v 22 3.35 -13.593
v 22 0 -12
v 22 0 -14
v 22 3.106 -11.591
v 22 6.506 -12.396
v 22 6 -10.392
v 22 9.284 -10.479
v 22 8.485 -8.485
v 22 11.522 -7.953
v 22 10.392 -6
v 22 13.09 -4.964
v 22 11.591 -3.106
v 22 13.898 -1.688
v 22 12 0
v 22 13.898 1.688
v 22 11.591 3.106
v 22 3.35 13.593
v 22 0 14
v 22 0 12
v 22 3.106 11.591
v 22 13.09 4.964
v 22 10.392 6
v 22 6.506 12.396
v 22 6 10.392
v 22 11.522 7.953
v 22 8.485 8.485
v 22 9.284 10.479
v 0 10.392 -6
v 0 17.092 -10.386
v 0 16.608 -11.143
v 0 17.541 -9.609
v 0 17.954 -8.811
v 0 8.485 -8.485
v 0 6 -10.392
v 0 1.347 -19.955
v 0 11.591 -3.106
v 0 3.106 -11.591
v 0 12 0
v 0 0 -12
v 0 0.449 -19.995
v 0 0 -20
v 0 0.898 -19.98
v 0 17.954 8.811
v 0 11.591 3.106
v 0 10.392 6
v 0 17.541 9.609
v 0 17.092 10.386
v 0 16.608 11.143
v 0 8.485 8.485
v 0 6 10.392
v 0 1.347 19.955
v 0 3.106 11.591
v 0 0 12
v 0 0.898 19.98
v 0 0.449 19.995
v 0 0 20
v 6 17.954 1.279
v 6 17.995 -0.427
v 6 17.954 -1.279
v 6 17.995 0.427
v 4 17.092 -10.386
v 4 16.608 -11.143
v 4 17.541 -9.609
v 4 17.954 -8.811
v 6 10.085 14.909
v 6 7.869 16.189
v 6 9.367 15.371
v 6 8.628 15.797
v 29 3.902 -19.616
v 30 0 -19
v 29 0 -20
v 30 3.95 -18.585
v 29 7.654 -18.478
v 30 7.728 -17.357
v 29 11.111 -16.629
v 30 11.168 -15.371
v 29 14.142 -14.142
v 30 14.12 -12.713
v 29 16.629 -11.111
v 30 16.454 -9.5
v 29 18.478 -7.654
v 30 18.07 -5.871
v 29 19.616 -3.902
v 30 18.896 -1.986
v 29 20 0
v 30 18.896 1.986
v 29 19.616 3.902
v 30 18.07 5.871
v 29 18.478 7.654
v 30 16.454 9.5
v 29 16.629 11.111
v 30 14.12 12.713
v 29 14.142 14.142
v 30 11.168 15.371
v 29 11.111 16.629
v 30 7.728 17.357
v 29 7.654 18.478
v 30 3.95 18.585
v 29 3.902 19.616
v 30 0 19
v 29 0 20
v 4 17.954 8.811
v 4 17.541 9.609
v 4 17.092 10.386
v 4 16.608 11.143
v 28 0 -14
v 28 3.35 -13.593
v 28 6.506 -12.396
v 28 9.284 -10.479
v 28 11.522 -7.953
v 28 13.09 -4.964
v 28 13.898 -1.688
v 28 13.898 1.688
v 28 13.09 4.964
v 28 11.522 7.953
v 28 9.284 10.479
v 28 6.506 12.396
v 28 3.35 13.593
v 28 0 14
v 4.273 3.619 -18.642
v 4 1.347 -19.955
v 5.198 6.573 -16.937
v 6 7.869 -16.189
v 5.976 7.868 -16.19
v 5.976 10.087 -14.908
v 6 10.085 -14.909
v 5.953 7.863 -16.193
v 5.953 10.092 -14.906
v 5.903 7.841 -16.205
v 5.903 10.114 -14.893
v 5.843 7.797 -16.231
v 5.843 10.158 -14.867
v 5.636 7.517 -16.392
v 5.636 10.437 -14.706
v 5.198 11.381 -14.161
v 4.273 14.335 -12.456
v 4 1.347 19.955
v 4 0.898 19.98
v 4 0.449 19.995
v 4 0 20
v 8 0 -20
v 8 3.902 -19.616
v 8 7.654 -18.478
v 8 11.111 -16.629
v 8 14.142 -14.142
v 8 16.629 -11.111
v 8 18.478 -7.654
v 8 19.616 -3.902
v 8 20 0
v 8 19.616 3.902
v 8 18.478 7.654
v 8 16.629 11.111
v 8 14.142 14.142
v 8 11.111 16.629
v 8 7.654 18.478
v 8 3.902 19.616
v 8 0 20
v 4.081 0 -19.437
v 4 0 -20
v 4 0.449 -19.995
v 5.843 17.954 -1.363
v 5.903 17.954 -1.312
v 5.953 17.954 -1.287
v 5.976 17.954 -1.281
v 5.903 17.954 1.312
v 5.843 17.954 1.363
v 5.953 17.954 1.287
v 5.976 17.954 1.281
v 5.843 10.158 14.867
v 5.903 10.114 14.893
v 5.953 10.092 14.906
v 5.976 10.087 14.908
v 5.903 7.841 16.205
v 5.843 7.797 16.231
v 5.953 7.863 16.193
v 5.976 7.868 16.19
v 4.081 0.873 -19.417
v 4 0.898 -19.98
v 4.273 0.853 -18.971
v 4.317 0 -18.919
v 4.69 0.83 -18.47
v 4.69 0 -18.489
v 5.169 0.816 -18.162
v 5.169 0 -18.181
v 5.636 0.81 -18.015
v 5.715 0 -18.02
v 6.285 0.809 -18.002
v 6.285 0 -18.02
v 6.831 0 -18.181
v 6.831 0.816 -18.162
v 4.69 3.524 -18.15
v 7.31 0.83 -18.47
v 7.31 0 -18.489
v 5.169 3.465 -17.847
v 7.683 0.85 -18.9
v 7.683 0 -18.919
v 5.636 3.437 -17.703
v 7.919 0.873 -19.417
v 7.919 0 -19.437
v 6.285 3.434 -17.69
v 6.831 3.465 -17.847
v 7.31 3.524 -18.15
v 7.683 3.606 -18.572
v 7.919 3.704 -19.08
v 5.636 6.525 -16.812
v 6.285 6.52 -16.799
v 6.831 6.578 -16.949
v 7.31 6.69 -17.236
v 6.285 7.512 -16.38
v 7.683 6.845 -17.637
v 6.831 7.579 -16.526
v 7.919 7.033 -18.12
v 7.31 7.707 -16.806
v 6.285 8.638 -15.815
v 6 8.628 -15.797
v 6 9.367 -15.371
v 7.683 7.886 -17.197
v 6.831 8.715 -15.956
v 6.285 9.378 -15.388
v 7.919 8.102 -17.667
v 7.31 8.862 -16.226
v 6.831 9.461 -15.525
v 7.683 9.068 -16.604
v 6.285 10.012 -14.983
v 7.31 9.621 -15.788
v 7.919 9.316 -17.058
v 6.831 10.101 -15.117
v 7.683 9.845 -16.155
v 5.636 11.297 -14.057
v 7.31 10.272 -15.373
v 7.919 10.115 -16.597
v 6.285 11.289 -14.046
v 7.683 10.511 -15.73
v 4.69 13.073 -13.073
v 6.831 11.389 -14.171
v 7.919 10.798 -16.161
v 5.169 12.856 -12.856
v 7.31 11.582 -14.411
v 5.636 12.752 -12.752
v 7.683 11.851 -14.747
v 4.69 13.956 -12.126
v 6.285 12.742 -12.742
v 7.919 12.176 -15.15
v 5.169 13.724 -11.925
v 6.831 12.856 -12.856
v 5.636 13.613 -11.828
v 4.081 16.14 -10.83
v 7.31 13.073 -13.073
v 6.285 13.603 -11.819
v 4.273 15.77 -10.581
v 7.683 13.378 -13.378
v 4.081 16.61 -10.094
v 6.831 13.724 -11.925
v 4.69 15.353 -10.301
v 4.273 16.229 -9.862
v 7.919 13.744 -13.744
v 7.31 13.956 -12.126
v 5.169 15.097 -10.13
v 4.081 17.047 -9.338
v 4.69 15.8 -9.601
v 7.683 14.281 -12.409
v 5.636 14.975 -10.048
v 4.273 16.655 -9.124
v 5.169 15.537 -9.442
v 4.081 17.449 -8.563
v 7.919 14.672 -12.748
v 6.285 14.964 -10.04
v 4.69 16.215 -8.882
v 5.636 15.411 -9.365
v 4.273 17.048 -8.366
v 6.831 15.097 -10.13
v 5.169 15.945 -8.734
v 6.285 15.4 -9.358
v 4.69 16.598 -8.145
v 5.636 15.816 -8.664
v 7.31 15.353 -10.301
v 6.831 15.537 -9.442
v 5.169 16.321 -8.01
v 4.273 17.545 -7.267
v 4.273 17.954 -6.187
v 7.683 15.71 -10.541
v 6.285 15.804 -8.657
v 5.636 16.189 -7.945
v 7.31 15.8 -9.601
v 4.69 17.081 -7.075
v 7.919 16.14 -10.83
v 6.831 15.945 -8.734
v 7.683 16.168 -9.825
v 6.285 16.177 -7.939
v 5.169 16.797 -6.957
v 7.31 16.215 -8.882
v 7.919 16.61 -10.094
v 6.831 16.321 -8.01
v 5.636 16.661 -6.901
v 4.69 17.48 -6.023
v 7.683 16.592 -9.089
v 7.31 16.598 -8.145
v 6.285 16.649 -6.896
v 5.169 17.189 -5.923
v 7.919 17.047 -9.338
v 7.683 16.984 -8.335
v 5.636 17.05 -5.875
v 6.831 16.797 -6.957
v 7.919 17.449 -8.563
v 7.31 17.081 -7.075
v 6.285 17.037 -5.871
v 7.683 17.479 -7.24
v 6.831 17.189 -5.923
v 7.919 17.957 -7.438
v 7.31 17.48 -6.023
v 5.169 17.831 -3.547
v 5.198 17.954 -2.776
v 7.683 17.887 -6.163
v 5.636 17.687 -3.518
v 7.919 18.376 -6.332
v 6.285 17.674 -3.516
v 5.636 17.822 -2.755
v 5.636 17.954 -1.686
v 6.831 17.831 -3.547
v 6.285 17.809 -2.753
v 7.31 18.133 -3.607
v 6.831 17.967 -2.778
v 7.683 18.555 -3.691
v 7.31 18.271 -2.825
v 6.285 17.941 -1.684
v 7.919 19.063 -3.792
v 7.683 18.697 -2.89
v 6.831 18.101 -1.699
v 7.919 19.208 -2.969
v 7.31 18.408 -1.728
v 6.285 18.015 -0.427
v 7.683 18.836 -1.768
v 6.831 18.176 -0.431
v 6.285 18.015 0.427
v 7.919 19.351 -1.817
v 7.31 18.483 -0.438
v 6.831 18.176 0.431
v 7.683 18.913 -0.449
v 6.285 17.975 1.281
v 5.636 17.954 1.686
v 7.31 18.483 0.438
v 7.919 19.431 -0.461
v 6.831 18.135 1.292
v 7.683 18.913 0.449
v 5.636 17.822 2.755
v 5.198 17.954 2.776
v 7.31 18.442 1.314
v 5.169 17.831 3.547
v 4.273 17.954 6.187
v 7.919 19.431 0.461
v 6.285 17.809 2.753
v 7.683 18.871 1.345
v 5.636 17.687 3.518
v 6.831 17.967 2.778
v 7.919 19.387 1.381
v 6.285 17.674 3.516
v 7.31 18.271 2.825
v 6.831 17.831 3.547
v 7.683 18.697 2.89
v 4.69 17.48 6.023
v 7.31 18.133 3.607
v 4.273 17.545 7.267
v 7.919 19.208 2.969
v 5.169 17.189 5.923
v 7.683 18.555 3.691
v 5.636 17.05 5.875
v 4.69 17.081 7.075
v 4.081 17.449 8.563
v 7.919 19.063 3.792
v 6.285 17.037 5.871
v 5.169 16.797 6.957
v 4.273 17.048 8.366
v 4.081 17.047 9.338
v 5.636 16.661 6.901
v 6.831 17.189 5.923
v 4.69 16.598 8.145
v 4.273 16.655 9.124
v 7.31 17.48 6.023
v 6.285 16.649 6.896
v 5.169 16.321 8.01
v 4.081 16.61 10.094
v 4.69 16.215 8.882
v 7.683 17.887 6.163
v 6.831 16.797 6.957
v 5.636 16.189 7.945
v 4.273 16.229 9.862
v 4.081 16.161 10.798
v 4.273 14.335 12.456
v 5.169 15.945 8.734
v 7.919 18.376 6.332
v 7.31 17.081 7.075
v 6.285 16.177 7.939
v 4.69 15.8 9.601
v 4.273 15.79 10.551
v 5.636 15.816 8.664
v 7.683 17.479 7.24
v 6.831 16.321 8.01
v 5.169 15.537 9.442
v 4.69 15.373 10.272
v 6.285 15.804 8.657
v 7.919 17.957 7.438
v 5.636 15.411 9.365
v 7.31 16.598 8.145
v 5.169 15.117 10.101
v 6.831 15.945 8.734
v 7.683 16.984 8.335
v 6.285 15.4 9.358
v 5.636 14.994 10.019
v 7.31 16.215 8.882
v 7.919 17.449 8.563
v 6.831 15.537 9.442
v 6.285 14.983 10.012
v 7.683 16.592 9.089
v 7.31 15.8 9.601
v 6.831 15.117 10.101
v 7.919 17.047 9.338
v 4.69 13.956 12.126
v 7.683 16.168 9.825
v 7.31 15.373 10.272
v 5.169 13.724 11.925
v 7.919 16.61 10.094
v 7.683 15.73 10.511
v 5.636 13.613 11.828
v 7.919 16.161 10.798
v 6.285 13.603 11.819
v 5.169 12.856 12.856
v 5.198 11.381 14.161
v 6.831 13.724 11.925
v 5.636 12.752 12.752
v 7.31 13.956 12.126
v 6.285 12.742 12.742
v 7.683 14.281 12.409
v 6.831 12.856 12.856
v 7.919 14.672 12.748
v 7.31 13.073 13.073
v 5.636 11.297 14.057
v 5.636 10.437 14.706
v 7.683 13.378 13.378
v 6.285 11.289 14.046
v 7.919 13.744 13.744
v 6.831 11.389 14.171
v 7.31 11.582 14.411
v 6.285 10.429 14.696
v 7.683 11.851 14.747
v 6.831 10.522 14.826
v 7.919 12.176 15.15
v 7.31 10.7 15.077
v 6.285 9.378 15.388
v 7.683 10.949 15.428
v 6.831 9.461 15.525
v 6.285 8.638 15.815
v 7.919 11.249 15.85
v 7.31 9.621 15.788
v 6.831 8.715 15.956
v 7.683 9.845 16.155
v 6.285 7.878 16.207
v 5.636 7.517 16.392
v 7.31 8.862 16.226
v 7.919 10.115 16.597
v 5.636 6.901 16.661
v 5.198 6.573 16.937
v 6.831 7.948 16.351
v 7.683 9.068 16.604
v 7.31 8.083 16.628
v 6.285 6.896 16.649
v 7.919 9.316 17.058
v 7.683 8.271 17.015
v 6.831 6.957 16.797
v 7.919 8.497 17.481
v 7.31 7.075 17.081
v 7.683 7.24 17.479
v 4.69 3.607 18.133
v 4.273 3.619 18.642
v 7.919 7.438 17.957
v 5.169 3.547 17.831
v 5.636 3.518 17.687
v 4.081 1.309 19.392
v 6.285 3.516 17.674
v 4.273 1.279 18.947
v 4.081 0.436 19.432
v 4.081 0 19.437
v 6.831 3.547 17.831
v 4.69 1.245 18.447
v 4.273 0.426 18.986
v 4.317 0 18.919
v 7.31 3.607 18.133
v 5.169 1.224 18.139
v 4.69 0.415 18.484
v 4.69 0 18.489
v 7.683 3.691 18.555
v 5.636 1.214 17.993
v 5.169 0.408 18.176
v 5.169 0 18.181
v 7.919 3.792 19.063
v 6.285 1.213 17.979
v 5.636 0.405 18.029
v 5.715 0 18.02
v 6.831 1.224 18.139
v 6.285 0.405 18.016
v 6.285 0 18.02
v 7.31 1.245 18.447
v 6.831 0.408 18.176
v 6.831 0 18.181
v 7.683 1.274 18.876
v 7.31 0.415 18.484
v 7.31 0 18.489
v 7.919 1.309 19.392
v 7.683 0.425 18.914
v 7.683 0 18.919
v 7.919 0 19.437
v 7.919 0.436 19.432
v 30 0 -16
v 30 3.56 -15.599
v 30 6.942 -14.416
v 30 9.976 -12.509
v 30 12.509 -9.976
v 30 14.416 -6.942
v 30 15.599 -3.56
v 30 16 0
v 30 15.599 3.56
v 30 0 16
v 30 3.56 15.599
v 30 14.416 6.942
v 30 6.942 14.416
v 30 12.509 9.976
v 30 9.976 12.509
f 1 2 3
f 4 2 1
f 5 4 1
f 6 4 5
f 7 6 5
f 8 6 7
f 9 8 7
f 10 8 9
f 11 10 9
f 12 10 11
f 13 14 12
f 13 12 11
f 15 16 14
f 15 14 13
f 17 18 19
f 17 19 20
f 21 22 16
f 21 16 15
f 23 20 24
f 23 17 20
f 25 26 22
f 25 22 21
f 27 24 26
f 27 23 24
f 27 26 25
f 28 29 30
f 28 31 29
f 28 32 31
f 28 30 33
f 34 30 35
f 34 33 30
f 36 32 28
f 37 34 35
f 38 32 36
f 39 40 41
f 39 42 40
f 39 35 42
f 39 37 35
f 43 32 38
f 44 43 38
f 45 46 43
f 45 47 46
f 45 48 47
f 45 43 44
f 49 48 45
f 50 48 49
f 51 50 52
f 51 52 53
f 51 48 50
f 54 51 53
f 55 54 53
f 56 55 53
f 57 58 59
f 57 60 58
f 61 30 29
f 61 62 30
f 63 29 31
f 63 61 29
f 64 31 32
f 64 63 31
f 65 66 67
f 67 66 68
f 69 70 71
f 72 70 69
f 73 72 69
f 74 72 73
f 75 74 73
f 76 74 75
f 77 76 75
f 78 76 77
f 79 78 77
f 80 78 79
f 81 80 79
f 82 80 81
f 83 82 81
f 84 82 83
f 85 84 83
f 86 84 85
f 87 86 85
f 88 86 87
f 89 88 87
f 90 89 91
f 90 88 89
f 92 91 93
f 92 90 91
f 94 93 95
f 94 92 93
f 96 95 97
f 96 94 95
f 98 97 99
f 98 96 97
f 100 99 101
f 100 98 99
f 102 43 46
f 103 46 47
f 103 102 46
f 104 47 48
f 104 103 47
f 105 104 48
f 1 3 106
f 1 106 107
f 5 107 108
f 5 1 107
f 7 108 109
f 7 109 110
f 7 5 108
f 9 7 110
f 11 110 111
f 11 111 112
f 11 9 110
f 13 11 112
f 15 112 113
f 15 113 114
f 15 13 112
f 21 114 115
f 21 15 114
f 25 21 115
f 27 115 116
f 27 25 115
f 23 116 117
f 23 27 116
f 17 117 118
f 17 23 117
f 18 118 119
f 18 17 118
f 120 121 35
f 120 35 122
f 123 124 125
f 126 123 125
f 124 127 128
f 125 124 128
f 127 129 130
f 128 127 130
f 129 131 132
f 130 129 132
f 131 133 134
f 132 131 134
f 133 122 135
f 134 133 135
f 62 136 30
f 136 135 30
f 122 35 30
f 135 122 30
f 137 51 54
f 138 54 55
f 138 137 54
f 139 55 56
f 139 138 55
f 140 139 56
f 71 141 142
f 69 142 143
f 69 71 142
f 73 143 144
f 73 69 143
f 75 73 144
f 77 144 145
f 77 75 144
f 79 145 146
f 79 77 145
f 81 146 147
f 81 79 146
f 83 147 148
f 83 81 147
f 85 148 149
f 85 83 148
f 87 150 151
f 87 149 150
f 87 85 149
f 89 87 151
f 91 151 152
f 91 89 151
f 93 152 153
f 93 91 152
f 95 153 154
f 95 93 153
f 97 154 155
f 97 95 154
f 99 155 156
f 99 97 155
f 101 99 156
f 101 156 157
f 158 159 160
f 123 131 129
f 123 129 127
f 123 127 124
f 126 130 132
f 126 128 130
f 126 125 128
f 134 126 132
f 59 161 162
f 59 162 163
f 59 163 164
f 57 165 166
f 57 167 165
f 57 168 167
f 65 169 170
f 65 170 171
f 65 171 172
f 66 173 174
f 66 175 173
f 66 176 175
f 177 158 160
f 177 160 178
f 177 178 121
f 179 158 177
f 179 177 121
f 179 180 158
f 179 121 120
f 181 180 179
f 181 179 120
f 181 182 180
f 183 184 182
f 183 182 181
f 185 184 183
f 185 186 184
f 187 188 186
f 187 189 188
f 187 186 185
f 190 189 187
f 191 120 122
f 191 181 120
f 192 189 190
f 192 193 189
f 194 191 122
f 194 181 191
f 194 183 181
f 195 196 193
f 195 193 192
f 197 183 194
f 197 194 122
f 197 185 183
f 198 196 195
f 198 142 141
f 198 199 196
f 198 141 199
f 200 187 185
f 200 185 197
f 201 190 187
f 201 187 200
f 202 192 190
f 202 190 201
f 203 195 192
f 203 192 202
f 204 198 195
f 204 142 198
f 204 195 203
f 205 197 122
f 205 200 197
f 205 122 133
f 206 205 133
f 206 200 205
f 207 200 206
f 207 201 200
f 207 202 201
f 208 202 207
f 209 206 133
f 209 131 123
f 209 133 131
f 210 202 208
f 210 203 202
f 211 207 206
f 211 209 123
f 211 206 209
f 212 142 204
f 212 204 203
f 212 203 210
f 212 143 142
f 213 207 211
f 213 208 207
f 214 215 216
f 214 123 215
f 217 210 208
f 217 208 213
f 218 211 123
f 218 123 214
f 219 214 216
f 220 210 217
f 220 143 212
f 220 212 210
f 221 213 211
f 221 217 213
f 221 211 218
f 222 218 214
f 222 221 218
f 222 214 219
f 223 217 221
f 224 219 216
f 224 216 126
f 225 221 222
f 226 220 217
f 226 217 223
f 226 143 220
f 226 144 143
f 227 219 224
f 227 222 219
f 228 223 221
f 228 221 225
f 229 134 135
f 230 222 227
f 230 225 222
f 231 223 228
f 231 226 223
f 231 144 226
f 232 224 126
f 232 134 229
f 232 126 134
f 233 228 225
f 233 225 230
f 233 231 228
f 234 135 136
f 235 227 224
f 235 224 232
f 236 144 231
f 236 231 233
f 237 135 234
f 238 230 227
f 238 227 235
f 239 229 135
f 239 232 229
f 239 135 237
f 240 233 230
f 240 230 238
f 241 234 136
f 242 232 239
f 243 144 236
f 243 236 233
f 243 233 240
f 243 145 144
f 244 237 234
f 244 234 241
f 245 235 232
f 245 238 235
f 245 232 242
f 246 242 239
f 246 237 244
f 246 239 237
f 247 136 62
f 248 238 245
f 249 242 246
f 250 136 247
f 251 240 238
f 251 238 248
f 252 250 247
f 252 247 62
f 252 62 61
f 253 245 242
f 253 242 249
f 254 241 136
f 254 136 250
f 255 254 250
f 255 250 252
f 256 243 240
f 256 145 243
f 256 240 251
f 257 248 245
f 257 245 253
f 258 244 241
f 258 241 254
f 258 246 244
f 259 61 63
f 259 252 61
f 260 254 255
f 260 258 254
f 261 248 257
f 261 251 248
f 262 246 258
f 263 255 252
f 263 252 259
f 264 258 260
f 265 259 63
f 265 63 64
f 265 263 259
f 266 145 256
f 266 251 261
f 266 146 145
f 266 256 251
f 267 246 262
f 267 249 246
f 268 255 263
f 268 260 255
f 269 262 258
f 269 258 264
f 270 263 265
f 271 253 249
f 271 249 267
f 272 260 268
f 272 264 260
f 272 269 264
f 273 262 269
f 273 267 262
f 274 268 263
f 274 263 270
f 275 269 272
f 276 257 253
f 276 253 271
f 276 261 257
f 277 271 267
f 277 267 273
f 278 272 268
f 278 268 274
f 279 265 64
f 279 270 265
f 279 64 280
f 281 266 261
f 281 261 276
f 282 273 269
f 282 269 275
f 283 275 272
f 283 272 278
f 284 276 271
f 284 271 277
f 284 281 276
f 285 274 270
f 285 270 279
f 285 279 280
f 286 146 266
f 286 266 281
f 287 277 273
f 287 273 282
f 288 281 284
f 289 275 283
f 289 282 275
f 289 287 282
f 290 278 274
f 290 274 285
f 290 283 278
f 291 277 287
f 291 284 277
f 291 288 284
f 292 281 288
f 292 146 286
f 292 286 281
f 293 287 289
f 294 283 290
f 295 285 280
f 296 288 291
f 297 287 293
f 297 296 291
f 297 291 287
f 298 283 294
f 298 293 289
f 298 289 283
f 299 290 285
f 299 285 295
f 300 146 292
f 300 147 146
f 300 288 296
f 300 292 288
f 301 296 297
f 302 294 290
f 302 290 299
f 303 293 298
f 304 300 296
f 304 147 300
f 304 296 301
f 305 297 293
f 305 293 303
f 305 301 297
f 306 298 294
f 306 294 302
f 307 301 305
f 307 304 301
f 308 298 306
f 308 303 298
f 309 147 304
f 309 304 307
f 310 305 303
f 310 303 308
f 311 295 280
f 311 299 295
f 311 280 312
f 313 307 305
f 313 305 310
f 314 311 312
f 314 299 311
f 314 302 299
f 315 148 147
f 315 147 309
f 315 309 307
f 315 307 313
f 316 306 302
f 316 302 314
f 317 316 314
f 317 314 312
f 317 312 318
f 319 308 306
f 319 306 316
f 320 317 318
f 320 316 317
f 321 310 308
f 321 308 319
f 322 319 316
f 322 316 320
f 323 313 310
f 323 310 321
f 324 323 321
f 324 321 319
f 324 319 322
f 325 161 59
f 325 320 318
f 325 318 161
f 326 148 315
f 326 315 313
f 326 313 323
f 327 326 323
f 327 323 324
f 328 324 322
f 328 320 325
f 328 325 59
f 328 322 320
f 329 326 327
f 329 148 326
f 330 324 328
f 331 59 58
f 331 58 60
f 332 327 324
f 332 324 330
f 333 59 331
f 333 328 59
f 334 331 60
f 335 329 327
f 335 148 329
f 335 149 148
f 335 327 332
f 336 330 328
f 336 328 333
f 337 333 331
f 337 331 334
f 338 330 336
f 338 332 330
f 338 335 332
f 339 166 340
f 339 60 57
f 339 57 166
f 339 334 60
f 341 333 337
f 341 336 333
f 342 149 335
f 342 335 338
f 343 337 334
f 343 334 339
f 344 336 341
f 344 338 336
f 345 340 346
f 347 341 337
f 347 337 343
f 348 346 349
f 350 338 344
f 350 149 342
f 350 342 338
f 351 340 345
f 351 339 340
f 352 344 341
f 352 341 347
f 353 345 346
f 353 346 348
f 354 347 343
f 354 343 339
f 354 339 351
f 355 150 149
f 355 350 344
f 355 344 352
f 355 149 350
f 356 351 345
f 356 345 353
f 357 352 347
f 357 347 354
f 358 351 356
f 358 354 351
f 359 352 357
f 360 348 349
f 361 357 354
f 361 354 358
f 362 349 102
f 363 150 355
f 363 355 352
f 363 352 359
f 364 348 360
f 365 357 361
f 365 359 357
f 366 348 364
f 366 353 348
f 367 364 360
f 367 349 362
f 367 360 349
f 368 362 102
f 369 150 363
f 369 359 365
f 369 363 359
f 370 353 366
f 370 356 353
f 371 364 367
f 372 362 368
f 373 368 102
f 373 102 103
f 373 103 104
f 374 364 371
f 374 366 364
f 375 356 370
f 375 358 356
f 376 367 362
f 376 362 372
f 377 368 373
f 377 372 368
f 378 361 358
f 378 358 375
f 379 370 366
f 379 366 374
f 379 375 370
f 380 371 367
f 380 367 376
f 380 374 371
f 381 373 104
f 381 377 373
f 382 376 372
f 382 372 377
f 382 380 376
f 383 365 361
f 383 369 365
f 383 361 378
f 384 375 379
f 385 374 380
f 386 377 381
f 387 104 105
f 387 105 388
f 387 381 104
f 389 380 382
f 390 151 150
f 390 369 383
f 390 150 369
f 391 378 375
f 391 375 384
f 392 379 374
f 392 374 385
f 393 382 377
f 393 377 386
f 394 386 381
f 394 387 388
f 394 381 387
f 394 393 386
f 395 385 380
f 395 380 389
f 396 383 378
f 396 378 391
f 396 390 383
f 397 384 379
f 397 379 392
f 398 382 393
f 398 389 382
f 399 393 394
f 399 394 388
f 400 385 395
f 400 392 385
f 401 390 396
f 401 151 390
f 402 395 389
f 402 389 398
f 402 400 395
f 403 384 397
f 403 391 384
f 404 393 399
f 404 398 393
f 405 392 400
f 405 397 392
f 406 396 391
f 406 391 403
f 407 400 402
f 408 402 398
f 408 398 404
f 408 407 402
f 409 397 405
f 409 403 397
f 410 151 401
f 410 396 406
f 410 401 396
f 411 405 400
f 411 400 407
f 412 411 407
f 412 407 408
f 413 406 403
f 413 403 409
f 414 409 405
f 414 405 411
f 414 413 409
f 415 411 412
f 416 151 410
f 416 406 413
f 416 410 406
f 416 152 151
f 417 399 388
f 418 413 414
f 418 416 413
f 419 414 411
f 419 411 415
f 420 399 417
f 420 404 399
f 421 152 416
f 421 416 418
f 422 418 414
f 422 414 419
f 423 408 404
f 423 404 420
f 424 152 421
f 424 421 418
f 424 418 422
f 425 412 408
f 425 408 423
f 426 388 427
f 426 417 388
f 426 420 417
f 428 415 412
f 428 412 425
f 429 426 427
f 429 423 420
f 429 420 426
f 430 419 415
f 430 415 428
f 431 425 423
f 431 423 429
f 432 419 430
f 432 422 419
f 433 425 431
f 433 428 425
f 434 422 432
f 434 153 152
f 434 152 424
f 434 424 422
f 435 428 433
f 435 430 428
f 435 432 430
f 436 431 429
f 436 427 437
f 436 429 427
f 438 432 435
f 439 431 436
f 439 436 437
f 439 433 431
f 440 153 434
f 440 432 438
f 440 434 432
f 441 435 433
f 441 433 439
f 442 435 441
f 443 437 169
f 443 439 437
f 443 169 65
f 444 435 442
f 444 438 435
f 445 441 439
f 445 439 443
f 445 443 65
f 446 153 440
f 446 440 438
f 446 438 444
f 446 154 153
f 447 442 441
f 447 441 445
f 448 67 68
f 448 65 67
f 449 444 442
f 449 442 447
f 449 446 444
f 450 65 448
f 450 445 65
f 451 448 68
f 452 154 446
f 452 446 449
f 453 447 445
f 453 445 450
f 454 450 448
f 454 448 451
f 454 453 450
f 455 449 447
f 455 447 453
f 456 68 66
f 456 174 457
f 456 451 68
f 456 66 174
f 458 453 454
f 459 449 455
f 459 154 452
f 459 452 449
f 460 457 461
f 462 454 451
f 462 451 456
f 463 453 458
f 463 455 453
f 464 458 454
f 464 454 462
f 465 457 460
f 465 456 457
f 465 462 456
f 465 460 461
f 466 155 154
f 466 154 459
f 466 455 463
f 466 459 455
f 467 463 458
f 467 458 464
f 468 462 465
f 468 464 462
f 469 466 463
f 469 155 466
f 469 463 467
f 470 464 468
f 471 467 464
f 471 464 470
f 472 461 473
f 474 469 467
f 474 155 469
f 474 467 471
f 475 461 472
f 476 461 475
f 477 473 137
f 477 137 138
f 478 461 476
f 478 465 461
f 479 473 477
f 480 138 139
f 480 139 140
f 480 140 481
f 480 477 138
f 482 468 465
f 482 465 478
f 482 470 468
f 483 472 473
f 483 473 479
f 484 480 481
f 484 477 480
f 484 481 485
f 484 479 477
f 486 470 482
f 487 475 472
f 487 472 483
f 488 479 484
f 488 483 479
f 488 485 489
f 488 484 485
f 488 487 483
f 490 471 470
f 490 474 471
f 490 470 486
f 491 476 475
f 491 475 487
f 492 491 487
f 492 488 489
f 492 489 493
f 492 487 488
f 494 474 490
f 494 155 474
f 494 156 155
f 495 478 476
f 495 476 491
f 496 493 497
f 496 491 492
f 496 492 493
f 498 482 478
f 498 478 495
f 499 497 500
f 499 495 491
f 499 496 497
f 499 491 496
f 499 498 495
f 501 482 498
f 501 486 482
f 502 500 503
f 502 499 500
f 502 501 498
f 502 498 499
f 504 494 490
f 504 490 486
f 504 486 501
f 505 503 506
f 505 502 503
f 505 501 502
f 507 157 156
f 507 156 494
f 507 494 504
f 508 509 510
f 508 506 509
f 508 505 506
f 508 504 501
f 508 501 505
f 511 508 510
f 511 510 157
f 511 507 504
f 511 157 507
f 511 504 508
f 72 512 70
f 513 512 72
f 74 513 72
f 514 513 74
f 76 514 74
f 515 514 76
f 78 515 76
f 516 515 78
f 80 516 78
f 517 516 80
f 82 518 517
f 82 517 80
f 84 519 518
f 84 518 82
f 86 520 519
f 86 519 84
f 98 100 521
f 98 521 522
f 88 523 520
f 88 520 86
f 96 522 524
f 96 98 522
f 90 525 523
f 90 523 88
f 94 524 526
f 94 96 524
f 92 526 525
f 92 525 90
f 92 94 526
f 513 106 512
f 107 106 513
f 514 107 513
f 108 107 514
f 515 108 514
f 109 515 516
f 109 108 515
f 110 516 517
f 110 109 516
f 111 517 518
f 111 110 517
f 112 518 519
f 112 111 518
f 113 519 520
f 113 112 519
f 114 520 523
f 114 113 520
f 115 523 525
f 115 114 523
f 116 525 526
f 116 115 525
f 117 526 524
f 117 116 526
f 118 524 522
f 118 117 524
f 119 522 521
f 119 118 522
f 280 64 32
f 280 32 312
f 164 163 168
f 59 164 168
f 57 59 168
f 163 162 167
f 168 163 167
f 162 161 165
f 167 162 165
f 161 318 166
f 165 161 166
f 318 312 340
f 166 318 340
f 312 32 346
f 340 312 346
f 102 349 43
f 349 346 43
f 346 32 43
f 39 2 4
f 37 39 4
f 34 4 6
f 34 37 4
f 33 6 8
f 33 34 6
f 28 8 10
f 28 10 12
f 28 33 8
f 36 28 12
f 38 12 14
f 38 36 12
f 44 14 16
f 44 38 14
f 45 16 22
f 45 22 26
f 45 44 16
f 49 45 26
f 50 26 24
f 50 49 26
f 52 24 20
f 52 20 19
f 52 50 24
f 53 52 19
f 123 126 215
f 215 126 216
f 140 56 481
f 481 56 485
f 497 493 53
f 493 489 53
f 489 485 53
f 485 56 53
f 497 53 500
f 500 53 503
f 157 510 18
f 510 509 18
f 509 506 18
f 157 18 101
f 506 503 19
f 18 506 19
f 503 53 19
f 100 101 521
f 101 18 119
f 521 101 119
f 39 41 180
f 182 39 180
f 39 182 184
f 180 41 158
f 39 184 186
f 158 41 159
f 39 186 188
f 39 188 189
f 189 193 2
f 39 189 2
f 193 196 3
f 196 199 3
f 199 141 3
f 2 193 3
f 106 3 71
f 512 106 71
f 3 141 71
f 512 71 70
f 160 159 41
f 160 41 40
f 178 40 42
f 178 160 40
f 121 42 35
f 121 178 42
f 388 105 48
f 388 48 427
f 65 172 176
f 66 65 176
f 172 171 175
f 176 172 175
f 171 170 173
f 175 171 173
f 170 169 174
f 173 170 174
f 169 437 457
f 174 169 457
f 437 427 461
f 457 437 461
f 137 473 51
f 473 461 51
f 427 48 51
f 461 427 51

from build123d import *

# Parameters (mm, degrees)
ESQUISSE3_R             = 23.853720884
ENL_V_MAT_EXTRU_2_DEPTH = 6
ESQUISSE4_W             = 60
ESQUISSE4_H             = 84
ENL_V_MAT_EXTRU_3_DEPTH = 42.231056353


with BuildPart() as part:
    # Esquisse1 → Base-Révolution (revolve)
    with BuildSketch(Plane.XY):
        with BuildLine():
            Line((0, 12), (0, 20))
            Line((0, 20), (4, 20))
            ThreePointArc((4, 20), (6, 18), (8, 20))
            Line((8, 20), (29, 20))
            Line((29, 20), (30, 19))
            Line((30, 19), (30, 16))
            Line((30, 16), (28, 14))
            Line((28, 14), (22, 14))
            Line((22, 14), (22, 12))
            Line((22, 12), (0, 12))
        make_face()
    revolve(axis=Axis((-10, 0, 0), (1, 0, 0)))

    # Esquisse3 → Enlèv. mat.-Extru.2 (cut)
    with BuildSketch(Plane.ZY):
        Circle(ESQUISSE3_R)
        Polygon((-20.732050808, 0), (-10.366025404, 17.954482672), (10.366025404, 17.954482672), (20.732050808, 0), (10.366025404, -17.954482672), (-10.366025404, -17.954482672), align=None, mode=Mode.SUBTRACT)
    extrude(amount=-ENL_V_MAT_EXTRU_2_DEPTH, mode=Mode.SUBTRACT)

    # Esquisse4 → Enlèv. mat.-Extru.3 (cut, through all)
    with BuildSketch(Plane(origin=(0, 0, 0), x_dir=(1, 0, 0), z_dir=(0, 1, 0))):
        with Locations((20, -4)):
            Rectangle(ESQUISSE4_W, ESQUISSE4_H)
    extrude(amount=-ENL_V_MAT_EXTRU_3_DEPTH, mode=Mode.SUBTRACT)


solid = part.part
